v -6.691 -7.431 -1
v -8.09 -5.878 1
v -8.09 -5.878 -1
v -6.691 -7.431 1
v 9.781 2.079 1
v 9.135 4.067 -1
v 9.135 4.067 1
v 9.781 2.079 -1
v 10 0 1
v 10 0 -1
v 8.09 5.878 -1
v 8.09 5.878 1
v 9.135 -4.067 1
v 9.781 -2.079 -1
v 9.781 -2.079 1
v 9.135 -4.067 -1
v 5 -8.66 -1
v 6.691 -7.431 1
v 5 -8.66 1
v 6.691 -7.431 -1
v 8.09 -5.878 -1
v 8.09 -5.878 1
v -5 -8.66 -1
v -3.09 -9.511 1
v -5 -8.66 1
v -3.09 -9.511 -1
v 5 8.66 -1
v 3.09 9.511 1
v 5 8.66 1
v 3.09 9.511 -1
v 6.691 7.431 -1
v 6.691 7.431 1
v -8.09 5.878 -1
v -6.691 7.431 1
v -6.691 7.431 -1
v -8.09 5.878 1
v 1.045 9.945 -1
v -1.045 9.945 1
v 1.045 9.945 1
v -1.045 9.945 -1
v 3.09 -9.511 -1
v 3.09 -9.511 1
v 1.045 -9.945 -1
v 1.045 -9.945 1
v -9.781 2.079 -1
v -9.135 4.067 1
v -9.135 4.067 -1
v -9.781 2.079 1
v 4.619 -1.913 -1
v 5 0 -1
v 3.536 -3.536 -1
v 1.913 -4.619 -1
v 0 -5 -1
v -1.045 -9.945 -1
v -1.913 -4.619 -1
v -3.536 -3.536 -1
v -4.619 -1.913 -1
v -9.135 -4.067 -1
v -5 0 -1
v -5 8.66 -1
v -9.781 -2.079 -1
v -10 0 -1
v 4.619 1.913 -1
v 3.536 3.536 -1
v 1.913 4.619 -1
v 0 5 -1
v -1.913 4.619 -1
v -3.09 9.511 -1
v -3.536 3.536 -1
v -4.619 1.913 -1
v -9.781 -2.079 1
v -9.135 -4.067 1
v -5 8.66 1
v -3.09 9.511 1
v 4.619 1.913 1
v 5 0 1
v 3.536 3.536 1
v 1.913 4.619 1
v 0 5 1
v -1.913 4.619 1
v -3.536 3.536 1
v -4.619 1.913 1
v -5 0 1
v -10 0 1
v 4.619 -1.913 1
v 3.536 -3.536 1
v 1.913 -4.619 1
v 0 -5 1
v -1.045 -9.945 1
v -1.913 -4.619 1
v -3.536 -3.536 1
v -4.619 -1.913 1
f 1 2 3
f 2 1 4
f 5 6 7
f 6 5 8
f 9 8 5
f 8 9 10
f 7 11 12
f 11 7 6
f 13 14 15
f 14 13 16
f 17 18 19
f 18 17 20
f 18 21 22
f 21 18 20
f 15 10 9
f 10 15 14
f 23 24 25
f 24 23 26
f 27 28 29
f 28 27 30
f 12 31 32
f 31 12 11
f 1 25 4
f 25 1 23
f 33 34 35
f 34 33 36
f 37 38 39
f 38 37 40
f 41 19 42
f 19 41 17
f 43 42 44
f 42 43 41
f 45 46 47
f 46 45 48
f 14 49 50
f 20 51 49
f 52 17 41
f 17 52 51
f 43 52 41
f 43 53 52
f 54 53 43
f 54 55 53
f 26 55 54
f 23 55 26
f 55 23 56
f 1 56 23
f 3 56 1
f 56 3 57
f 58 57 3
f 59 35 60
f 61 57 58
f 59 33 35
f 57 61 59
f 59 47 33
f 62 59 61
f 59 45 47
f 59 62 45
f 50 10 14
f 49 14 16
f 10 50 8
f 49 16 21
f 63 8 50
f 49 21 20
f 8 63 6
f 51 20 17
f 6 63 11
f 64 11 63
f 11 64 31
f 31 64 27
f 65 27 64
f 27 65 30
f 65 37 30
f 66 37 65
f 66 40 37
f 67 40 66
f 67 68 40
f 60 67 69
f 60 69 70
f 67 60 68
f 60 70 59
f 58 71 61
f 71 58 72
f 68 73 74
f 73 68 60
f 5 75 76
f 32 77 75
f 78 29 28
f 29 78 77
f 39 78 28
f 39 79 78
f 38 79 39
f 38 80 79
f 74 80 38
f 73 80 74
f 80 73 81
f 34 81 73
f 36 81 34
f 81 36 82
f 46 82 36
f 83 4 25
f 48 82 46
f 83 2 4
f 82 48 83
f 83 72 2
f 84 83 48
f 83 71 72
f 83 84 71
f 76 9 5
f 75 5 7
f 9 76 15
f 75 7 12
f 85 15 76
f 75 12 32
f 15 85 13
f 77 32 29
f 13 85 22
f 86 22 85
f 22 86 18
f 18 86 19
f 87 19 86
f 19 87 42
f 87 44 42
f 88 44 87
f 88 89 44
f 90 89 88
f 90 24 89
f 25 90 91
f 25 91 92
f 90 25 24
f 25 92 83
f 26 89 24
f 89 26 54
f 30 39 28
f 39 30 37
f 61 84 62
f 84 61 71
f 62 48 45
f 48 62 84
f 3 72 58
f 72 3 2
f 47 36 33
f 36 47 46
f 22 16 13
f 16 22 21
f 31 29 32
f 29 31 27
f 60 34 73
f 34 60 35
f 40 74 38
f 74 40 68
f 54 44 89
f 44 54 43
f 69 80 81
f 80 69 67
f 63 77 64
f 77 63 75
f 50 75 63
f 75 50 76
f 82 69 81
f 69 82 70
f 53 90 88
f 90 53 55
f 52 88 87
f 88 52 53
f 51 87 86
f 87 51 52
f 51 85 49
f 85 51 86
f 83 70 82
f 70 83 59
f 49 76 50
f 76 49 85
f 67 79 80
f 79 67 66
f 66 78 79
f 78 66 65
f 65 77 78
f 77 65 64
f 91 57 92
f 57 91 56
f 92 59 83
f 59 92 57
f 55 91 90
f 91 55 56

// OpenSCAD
// Parameters for the washer
inner_diameter = 10; // Inner hole diameter
outer_diameter = 20; // Outer diameter of the washer
thickness = 2;       // Thickness of the washer

// Washer body
module washer_body() {
    difference() {
        // Outer cylinder
        cylinder(h = thickness, d = outer_diameter, center = true);
        // Inner hole
        cylinder(h = thickness + 1, d = inner_diameter, center = true);
    }
}

// Render the washer
washer_body();
